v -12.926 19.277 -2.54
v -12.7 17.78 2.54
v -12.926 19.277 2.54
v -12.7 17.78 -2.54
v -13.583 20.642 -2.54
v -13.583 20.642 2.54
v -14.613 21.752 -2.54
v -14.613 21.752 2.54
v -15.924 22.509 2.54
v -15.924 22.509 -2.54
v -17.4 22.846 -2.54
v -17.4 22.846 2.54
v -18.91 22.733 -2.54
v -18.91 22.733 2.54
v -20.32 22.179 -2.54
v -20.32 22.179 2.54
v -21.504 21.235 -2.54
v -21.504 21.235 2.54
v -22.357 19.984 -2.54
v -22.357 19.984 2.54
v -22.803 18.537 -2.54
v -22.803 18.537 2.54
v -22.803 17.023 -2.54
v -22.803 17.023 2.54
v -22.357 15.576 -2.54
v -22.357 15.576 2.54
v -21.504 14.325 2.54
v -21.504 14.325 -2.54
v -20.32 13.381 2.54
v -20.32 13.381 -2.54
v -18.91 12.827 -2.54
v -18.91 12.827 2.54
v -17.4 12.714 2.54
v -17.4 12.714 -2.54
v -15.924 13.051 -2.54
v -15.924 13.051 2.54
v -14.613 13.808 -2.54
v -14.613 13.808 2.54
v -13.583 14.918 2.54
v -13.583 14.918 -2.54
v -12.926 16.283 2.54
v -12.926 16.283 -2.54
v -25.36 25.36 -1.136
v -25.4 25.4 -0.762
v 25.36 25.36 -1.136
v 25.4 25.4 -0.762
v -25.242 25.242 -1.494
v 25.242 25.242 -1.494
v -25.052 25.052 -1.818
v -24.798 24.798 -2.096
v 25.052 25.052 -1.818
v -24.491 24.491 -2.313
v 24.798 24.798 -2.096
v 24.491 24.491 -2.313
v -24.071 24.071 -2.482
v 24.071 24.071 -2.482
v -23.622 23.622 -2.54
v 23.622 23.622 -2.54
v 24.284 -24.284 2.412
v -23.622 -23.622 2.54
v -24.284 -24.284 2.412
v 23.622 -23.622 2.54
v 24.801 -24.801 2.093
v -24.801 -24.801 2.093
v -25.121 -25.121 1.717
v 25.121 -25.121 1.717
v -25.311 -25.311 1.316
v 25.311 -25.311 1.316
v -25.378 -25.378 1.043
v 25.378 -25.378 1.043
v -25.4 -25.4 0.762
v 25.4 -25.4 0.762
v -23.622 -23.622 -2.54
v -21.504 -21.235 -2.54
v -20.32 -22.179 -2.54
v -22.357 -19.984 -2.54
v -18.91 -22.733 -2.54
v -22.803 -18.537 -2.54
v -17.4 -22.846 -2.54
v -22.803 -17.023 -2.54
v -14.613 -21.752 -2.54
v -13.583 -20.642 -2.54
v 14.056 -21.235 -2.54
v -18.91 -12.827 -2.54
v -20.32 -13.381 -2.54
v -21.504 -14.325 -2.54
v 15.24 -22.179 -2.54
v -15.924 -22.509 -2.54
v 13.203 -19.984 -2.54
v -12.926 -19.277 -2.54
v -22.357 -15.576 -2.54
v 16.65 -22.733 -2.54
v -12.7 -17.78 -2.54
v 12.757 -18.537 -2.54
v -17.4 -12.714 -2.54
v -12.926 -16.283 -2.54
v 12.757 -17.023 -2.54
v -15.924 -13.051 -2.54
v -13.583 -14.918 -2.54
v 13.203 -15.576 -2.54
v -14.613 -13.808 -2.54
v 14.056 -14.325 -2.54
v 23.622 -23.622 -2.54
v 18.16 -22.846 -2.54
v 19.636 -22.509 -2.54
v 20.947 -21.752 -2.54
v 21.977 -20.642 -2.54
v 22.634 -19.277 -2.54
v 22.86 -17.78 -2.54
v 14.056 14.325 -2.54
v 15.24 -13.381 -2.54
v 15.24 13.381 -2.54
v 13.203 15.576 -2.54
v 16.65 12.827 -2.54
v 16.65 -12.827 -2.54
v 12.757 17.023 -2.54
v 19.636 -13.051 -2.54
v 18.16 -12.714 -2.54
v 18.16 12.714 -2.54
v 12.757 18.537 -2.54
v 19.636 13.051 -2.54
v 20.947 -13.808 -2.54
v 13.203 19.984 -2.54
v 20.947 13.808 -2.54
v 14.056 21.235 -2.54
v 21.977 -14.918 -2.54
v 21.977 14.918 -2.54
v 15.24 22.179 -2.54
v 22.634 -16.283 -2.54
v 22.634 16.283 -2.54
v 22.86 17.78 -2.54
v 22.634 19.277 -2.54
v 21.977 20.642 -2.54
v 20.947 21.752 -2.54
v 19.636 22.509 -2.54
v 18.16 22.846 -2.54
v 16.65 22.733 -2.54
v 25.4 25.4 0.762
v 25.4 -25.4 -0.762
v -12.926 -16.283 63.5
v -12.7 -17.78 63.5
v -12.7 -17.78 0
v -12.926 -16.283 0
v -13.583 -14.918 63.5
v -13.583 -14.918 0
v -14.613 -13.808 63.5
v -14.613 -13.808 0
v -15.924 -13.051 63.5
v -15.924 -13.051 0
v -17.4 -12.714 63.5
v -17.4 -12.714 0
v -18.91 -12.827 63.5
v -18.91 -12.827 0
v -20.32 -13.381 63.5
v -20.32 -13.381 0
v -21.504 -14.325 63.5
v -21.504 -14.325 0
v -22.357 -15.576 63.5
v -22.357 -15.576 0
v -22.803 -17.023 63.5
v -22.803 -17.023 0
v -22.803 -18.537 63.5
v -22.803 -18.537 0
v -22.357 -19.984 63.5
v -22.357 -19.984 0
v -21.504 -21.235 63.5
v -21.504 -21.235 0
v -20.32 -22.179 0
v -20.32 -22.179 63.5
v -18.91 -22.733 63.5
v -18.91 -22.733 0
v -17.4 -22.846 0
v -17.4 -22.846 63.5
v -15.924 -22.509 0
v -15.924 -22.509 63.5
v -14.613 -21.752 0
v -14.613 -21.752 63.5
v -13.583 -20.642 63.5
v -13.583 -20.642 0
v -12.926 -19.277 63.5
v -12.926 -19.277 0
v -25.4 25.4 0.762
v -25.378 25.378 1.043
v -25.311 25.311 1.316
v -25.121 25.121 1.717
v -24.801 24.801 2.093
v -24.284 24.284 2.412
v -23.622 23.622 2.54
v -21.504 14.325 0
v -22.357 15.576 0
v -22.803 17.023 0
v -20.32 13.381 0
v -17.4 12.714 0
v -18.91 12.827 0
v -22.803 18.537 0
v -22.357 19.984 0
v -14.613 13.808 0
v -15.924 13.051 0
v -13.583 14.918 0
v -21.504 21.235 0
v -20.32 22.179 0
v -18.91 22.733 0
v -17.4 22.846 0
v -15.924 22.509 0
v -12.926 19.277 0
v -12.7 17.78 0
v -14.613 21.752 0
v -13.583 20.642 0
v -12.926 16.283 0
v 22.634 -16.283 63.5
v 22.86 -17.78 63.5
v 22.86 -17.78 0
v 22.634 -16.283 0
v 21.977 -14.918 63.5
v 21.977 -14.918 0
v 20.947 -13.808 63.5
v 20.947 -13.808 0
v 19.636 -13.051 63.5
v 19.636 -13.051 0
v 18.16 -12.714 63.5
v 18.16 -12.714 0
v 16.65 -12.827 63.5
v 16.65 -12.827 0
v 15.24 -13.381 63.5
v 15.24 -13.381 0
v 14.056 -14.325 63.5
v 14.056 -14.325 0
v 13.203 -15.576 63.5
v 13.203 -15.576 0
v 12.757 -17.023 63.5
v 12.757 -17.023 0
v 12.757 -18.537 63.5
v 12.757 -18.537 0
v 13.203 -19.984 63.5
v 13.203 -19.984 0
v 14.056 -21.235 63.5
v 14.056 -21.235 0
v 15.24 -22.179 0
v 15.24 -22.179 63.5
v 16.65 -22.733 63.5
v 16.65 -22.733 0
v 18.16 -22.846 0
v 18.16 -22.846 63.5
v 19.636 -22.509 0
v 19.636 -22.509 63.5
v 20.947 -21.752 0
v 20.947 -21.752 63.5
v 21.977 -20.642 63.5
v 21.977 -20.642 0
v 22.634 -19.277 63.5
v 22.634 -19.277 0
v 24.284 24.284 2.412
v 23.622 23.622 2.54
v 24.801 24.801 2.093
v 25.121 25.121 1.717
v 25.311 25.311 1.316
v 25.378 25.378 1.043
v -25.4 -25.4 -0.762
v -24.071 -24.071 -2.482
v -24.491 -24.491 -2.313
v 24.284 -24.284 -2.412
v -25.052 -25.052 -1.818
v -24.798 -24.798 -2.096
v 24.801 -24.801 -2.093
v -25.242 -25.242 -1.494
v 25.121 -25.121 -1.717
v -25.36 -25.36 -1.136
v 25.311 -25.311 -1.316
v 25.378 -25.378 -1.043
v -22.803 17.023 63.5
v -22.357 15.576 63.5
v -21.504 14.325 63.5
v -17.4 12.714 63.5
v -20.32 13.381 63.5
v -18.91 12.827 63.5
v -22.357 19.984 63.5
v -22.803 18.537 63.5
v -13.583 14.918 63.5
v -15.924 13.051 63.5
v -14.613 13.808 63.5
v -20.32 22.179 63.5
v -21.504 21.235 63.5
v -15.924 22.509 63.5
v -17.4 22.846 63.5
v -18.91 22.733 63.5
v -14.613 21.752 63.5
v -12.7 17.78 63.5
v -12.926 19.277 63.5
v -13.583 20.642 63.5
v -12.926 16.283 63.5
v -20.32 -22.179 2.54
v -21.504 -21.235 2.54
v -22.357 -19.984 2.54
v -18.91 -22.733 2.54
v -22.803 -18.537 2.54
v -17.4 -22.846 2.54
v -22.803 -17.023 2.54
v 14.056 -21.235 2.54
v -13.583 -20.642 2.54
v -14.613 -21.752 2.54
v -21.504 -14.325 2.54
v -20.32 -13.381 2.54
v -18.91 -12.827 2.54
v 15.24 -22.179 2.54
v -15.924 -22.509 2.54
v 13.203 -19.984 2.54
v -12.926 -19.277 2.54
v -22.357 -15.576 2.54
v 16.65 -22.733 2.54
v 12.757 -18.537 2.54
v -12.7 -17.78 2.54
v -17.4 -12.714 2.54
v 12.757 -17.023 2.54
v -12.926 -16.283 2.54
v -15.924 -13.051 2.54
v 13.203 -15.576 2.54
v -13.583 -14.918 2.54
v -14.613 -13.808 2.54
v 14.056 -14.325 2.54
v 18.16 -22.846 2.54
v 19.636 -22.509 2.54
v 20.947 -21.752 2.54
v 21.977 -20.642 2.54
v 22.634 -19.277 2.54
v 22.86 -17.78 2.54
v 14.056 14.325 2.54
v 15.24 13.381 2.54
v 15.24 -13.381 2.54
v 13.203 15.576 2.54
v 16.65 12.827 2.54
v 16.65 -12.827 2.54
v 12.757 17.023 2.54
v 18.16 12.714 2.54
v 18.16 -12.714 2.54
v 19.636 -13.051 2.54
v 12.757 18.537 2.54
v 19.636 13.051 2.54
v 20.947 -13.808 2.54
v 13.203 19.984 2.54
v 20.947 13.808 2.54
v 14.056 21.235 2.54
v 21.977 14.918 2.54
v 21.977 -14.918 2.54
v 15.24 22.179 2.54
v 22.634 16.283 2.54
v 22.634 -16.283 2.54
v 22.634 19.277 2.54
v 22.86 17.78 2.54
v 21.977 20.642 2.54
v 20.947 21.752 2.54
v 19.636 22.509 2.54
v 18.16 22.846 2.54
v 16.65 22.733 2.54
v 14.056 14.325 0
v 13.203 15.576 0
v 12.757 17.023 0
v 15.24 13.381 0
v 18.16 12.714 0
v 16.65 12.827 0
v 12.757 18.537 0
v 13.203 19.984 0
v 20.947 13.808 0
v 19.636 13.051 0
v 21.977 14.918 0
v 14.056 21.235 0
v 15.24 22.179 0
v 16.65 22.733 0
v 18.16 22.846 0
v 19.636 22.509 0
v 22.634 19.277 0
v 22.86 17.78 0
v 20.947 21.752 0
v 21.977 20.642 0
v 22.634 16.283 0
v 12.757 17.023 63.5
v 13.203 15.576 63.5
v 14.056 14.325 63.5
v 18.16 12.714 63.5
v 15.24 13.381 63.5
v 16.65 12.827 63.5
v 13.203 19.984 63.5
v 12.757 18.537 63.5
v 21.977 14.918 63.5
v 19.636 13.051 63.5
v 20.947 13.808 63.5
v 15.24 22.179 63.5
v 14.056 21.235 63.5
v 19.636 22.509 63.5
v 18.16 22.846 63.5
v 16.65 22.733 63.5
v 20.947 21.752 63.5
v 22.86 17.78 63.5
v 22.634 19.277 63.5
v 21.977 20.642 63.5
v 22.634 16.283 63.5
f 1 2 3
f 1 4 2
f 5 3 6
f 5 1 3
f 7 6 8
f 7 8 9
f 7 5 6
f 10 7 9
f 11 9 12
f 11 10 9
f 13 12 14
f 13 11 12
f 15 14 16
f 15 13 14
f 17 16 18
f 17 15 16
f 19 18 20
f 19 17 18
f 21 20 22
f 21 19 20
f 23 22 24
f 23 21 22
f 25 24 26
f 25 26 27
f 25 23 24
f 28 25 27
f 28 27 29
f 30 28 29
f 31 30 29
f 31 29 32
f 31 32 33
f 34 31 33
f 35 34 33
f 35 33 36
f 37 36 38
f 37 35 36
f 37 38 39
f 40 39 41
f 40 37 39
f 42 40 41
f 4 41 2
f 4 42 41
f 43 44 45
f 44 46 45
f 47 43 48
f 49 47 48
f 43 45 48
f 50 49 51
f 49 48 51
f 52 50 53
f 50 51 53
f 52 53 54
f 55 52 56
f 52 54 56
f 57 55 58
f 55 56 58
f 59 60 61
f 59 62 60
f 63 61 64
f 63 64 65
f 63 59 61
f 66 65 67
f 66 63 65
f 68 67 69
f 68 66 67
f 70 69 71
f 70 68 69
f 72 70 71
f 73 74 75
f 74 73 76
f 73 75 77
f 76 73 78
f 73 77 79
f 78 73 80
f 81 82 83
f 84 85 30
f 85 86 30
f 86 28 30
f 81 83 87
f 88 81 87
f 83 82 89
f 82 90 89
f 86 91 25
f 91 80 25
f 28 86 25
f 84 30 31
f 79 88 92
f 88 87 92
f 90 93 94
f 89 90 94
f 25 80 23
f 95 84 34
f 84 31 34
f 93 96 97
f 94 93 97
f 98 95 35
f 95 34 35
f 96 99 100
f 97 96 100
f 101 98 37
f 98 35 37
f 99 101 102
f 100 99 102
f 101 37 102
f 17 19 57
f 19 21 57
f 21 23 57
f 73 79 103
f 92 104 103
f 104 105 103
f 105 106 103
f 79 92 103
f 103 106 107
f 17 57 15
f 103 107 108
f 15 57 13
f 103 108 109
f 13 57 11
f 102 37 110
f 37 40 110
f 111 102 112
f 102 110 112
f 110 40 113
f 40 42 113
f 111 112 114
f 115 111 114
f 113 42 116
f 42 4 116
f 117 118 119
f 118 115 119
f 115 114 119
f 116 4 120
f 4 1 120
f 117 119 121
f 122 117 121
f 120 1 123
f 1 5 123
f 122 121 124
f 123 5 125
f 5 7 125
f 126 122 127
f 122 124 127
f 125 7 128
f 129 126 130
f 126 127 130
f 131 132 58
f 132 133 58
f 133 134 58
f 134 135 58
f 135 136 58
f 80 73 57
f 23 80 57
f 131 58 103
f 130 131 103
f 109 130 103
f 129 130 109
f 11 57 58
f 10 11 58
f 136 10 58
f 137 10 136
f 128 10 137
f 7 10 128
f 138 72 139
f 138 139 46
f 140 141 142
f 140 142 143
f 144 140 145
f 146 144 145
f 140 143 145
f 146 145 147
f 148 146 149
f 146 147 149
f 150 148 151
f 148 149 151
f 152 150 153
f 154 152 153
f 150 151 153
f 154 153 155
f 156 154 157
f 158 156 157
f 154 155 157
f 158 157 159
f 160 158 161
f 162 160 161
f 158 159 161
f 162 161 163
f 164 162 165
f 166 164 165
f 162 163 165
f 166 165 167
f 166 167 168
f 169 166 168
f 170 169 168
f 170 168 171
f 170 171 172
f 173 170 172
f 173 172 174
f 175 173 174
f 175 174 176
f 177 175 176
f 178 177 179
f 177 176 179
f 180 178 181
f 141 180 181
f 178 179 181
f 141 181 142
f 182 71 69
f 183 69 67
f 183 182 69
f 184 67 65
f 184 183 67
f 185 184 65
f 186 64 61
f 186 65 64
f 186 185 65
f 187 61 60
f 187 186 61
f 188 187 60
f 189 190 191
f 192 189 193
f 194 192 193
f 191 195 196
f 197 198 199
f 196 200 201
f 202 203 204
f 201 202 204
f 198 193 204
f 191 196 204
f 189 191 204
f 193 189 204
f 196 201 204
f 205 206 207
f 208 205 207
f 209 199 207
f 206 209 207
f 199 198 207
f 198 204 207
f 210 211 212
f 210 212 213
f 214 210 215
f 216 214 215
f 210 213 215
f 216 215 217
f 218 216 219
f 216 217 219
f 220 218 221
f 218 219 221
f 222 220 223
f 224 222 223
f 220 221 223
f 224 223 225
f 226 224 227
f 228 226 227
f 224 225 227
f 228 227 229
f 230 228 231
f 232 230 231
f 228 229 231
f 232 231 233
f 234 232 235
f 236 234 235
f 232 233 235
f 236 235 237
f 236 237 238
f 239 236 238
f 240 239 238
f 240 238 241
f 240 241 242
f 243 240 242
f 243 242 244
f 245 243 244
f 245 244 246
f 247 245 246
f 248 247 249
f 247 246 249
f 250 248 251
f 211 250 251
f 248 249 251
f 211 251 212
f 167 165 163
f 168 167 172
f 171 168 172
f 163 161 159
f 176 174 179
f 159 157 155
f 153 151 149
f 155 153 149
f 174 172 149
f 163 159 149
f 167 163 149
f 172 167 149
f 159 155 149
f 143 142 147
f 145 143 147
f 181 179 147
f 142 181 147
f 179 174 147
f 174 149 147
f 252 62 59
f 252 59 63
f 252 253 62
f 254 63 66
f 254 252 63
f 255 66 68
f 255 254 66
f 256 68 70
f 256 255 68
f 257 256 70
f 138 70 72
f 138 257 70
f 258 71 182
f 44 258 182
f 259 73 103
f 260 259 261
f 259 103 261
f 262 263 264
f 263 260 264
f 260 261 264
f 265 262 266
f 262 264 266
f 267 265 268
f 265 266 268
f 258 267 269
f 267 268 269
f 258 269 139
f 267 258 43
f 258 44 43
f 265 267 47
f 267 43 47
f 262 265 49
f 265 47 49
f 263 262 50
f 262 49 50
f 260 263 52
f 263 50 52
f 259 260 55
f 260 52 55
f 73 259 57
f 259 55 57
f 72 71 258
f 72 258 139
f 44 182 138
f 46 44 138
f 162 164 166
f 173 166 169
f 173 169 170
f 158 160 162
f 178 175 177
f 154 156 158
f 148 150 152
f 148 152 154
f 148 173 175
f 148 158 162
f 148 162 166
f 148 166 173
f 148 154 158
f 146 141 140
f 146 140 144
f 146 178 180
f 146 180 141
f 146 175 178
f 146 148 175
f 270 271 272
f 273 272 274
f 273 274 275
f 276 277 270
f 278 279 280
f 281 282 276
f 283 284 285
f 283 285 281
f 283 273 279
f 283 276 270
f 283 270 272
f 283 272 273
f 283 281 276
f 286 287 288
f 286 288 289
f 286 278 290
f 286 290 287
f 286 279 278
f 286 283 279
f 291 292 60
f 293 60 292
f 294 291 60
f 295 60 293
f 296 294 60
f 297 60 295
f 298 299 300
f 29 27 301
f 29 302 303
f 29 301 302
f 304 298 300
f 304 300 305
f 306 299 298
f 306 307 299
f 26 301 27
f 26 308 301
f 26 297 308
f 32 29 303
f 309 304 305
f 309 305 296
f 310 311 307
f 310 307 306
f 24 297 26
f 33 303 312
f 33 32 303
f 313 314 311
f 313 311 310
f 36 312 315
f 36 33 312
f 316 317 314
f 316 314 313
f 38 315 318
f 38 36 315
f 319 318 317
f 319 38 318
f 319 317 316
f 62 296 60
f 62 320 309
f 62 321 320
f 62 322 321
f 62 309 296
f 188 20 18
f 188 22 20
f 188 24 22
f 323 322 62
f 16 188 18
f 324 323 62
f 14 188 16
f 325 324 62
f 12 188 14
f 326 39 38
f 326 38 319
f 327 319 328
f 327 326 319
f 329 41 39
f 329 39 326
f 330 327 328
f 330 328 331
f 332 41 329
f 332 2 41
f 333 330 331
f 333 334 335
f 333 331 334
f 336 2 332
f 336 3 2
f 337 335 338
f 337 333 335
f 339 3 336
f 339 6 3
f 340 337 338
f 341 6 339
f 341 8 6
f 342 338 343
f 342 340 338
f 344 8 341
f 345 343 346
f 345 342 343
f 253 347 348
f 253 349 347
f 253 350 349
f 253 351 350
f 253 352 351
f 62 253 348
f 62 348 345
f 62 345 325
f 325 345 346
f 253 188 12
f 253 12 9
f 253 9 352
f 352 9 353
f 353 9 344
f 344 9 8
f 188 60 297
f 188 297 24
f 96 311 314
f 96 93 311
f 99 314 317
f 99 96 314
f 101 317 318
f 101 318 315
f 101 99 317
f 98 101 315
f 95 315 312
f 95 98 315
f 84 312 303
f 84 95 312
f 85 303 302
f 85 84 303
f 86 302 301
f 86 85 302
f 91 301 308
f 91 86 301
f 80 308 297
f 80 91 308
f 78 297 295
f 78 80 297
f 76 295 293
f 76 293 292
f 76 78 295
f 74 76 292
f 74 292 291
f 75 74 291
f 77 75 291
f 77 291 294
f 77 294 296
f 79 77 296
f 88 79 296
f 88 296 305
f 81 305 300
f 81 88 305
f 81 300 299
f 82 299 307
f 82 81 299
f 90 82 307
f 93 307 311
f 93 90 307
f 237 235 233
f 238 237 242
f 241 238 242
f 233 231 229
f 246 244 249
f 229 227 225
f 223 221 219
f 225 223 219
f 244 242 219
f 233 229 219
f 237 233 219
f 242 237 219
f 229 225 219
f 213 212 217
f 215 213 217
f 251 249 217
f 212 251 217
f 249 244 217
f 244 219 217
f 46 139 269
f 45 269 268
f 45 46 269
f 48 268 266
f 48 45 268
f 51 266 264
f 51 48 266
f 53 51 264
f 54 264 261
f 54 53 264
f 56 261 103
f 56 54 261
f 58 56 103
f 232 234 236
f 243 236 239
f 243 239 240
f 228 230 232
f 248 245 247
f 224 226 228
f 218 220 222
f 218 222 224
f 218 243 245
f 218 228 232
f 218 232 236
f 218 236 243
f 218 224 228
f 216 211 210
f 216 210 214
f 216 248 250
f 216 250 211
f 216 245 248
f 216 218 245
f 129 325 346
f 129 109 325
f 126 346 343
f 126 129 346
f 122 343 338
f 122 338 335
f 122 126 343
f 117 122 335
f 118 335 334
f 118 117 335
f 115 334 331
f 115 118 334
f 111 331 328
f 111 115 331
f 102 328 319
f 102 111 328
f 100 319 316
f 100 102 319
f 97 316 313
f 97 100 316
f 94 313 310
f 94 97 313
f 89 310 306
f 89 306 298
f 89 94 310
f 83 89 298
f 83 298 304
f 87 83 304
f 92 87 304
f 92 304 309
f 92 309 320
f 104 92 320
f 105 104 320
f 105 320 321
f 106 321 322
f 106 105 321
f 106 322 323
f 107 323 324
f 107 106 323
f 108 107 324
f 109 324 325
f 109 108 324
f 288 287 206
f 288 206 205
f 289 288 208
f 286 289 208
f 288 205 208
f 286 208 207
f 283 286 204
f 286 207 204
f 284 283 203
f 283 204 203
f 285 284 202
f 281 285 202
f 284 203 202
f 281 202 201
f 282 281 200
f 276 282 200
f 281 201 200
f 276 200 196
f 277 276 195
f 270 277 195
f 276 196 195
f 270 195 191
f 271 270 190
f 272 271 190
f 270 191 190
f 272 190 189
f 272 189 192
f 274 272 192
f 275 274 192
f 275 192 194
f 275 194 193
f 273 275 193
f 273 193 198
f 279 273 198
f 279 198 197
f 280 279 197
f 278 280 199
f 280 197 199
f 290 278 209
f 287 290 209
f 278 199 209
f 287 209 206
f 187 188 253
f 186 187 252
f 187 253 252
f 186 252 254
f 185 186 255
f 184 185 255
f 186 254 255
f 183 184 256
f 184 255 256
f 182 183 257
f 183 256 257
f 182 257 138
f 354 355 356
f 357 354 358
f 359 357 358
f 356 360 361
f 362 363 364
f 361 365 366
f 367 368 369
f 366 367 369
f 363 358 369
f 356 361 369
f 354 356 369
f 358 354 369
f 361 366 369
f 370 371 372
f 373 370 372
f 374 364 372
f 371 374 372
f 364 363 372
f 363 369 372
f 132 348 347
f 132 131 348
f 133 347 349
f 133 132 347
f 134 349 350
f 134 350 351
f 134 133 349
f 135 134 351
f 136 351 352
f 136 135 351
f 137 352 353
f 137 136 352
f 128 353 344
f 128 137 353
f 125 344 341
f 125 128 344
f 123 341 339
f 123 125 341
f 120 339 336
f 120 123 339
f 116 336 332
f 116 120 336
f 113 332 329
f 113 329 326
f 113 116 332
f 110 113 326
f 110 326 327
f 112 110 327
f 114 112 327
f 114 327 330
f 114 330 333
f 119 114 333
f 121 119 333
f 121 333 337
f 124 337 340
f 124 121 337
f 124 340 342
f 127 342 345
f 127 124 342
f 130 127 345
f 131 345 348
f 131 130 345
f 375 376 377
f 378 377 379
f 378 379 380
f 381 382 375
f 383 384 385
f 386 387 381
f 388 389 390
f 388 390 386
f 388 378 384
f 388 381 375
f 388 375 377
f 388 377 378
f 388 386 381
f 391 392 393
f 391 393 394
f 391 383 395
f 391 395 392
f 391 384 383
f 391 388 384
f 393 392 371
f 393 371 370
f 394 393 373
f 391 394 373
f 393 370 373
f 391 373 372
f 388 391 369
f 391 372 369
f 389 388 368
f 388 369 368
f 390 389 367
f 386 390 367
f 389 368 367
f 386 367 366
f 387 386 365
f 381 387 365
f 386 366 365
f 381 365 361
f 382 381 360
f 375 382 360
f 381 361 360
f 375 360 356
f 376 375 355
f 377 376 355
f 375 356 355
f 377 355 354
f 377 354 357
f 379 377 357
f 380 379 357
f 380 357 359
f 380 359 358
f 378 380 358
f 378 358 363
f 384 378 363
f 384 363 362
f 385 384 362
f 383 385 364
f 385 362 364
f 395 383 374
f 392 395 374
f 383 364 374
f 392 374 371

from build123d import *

# Parameters (mm, degrees)
F0_R     = 5.08
F1_DEPTH = 63.5
F0_W     = 50.8
F0_H     = 50.8
F2_DEPTH = 2.54
F3_R     = 1.778


with BuildPart() as f1:
    # F0 (on Top) → F1 (new body)
    with BuildSketch(Plane.XY):
        with Locations((-17.78, 17.78)):
            Circle(F0_R)
        with Locations((17.78, 17.78)):
            Circle(F0_R)
        with Locations((17.78, -17.78)):
            Circle(F0_R)
        with Locations((-17.78, -17.78)):
            Circle(F0_R)
    extrude(amount=F1_DEPTH)


with BuildPart() as f2:
    # F0 (on Top) → F2 (new body, symmetric)
    with BuildSketch(Plane.XY):
        Rectangle(F0_W, F0_H)
        with Locations((-17.78, -17.78)):
            Circle(F0_R, mode=Mode.SUBTRACT)
        with Locations((17.78, -17.78)):
            Circle(F0_R, mode=Mode.SUBTRACT)
        with Locations((-17.78, 17.78)):
            Circle(F0_R, mode=Mode.SUBTRACT)
        with Locations((17.78, 17.78)):
            Circle(F0_R, mode=Mode.SUBTRACT)
    extrude(amount=F2_DEPTH, both=True)

    # F3
    f3_edges = [f2.edges().sort_by_distance(p)[0] for p in [
        (-25.4, 0, -2.54),
        (0, -25.4, -2.54),
        (25.4, 0, -2.54),
        (0, 25.4, -2.54),
        (0, -25.4, 2.54),
        (25.4, 0, 2.54),
        (0, 25.4, 2.54),
        (-25.4, 0, 2.54),
    ]]
    fillet(f3_edges, radius=F3_R)


solid = Compound([f1.part, f2.part])
